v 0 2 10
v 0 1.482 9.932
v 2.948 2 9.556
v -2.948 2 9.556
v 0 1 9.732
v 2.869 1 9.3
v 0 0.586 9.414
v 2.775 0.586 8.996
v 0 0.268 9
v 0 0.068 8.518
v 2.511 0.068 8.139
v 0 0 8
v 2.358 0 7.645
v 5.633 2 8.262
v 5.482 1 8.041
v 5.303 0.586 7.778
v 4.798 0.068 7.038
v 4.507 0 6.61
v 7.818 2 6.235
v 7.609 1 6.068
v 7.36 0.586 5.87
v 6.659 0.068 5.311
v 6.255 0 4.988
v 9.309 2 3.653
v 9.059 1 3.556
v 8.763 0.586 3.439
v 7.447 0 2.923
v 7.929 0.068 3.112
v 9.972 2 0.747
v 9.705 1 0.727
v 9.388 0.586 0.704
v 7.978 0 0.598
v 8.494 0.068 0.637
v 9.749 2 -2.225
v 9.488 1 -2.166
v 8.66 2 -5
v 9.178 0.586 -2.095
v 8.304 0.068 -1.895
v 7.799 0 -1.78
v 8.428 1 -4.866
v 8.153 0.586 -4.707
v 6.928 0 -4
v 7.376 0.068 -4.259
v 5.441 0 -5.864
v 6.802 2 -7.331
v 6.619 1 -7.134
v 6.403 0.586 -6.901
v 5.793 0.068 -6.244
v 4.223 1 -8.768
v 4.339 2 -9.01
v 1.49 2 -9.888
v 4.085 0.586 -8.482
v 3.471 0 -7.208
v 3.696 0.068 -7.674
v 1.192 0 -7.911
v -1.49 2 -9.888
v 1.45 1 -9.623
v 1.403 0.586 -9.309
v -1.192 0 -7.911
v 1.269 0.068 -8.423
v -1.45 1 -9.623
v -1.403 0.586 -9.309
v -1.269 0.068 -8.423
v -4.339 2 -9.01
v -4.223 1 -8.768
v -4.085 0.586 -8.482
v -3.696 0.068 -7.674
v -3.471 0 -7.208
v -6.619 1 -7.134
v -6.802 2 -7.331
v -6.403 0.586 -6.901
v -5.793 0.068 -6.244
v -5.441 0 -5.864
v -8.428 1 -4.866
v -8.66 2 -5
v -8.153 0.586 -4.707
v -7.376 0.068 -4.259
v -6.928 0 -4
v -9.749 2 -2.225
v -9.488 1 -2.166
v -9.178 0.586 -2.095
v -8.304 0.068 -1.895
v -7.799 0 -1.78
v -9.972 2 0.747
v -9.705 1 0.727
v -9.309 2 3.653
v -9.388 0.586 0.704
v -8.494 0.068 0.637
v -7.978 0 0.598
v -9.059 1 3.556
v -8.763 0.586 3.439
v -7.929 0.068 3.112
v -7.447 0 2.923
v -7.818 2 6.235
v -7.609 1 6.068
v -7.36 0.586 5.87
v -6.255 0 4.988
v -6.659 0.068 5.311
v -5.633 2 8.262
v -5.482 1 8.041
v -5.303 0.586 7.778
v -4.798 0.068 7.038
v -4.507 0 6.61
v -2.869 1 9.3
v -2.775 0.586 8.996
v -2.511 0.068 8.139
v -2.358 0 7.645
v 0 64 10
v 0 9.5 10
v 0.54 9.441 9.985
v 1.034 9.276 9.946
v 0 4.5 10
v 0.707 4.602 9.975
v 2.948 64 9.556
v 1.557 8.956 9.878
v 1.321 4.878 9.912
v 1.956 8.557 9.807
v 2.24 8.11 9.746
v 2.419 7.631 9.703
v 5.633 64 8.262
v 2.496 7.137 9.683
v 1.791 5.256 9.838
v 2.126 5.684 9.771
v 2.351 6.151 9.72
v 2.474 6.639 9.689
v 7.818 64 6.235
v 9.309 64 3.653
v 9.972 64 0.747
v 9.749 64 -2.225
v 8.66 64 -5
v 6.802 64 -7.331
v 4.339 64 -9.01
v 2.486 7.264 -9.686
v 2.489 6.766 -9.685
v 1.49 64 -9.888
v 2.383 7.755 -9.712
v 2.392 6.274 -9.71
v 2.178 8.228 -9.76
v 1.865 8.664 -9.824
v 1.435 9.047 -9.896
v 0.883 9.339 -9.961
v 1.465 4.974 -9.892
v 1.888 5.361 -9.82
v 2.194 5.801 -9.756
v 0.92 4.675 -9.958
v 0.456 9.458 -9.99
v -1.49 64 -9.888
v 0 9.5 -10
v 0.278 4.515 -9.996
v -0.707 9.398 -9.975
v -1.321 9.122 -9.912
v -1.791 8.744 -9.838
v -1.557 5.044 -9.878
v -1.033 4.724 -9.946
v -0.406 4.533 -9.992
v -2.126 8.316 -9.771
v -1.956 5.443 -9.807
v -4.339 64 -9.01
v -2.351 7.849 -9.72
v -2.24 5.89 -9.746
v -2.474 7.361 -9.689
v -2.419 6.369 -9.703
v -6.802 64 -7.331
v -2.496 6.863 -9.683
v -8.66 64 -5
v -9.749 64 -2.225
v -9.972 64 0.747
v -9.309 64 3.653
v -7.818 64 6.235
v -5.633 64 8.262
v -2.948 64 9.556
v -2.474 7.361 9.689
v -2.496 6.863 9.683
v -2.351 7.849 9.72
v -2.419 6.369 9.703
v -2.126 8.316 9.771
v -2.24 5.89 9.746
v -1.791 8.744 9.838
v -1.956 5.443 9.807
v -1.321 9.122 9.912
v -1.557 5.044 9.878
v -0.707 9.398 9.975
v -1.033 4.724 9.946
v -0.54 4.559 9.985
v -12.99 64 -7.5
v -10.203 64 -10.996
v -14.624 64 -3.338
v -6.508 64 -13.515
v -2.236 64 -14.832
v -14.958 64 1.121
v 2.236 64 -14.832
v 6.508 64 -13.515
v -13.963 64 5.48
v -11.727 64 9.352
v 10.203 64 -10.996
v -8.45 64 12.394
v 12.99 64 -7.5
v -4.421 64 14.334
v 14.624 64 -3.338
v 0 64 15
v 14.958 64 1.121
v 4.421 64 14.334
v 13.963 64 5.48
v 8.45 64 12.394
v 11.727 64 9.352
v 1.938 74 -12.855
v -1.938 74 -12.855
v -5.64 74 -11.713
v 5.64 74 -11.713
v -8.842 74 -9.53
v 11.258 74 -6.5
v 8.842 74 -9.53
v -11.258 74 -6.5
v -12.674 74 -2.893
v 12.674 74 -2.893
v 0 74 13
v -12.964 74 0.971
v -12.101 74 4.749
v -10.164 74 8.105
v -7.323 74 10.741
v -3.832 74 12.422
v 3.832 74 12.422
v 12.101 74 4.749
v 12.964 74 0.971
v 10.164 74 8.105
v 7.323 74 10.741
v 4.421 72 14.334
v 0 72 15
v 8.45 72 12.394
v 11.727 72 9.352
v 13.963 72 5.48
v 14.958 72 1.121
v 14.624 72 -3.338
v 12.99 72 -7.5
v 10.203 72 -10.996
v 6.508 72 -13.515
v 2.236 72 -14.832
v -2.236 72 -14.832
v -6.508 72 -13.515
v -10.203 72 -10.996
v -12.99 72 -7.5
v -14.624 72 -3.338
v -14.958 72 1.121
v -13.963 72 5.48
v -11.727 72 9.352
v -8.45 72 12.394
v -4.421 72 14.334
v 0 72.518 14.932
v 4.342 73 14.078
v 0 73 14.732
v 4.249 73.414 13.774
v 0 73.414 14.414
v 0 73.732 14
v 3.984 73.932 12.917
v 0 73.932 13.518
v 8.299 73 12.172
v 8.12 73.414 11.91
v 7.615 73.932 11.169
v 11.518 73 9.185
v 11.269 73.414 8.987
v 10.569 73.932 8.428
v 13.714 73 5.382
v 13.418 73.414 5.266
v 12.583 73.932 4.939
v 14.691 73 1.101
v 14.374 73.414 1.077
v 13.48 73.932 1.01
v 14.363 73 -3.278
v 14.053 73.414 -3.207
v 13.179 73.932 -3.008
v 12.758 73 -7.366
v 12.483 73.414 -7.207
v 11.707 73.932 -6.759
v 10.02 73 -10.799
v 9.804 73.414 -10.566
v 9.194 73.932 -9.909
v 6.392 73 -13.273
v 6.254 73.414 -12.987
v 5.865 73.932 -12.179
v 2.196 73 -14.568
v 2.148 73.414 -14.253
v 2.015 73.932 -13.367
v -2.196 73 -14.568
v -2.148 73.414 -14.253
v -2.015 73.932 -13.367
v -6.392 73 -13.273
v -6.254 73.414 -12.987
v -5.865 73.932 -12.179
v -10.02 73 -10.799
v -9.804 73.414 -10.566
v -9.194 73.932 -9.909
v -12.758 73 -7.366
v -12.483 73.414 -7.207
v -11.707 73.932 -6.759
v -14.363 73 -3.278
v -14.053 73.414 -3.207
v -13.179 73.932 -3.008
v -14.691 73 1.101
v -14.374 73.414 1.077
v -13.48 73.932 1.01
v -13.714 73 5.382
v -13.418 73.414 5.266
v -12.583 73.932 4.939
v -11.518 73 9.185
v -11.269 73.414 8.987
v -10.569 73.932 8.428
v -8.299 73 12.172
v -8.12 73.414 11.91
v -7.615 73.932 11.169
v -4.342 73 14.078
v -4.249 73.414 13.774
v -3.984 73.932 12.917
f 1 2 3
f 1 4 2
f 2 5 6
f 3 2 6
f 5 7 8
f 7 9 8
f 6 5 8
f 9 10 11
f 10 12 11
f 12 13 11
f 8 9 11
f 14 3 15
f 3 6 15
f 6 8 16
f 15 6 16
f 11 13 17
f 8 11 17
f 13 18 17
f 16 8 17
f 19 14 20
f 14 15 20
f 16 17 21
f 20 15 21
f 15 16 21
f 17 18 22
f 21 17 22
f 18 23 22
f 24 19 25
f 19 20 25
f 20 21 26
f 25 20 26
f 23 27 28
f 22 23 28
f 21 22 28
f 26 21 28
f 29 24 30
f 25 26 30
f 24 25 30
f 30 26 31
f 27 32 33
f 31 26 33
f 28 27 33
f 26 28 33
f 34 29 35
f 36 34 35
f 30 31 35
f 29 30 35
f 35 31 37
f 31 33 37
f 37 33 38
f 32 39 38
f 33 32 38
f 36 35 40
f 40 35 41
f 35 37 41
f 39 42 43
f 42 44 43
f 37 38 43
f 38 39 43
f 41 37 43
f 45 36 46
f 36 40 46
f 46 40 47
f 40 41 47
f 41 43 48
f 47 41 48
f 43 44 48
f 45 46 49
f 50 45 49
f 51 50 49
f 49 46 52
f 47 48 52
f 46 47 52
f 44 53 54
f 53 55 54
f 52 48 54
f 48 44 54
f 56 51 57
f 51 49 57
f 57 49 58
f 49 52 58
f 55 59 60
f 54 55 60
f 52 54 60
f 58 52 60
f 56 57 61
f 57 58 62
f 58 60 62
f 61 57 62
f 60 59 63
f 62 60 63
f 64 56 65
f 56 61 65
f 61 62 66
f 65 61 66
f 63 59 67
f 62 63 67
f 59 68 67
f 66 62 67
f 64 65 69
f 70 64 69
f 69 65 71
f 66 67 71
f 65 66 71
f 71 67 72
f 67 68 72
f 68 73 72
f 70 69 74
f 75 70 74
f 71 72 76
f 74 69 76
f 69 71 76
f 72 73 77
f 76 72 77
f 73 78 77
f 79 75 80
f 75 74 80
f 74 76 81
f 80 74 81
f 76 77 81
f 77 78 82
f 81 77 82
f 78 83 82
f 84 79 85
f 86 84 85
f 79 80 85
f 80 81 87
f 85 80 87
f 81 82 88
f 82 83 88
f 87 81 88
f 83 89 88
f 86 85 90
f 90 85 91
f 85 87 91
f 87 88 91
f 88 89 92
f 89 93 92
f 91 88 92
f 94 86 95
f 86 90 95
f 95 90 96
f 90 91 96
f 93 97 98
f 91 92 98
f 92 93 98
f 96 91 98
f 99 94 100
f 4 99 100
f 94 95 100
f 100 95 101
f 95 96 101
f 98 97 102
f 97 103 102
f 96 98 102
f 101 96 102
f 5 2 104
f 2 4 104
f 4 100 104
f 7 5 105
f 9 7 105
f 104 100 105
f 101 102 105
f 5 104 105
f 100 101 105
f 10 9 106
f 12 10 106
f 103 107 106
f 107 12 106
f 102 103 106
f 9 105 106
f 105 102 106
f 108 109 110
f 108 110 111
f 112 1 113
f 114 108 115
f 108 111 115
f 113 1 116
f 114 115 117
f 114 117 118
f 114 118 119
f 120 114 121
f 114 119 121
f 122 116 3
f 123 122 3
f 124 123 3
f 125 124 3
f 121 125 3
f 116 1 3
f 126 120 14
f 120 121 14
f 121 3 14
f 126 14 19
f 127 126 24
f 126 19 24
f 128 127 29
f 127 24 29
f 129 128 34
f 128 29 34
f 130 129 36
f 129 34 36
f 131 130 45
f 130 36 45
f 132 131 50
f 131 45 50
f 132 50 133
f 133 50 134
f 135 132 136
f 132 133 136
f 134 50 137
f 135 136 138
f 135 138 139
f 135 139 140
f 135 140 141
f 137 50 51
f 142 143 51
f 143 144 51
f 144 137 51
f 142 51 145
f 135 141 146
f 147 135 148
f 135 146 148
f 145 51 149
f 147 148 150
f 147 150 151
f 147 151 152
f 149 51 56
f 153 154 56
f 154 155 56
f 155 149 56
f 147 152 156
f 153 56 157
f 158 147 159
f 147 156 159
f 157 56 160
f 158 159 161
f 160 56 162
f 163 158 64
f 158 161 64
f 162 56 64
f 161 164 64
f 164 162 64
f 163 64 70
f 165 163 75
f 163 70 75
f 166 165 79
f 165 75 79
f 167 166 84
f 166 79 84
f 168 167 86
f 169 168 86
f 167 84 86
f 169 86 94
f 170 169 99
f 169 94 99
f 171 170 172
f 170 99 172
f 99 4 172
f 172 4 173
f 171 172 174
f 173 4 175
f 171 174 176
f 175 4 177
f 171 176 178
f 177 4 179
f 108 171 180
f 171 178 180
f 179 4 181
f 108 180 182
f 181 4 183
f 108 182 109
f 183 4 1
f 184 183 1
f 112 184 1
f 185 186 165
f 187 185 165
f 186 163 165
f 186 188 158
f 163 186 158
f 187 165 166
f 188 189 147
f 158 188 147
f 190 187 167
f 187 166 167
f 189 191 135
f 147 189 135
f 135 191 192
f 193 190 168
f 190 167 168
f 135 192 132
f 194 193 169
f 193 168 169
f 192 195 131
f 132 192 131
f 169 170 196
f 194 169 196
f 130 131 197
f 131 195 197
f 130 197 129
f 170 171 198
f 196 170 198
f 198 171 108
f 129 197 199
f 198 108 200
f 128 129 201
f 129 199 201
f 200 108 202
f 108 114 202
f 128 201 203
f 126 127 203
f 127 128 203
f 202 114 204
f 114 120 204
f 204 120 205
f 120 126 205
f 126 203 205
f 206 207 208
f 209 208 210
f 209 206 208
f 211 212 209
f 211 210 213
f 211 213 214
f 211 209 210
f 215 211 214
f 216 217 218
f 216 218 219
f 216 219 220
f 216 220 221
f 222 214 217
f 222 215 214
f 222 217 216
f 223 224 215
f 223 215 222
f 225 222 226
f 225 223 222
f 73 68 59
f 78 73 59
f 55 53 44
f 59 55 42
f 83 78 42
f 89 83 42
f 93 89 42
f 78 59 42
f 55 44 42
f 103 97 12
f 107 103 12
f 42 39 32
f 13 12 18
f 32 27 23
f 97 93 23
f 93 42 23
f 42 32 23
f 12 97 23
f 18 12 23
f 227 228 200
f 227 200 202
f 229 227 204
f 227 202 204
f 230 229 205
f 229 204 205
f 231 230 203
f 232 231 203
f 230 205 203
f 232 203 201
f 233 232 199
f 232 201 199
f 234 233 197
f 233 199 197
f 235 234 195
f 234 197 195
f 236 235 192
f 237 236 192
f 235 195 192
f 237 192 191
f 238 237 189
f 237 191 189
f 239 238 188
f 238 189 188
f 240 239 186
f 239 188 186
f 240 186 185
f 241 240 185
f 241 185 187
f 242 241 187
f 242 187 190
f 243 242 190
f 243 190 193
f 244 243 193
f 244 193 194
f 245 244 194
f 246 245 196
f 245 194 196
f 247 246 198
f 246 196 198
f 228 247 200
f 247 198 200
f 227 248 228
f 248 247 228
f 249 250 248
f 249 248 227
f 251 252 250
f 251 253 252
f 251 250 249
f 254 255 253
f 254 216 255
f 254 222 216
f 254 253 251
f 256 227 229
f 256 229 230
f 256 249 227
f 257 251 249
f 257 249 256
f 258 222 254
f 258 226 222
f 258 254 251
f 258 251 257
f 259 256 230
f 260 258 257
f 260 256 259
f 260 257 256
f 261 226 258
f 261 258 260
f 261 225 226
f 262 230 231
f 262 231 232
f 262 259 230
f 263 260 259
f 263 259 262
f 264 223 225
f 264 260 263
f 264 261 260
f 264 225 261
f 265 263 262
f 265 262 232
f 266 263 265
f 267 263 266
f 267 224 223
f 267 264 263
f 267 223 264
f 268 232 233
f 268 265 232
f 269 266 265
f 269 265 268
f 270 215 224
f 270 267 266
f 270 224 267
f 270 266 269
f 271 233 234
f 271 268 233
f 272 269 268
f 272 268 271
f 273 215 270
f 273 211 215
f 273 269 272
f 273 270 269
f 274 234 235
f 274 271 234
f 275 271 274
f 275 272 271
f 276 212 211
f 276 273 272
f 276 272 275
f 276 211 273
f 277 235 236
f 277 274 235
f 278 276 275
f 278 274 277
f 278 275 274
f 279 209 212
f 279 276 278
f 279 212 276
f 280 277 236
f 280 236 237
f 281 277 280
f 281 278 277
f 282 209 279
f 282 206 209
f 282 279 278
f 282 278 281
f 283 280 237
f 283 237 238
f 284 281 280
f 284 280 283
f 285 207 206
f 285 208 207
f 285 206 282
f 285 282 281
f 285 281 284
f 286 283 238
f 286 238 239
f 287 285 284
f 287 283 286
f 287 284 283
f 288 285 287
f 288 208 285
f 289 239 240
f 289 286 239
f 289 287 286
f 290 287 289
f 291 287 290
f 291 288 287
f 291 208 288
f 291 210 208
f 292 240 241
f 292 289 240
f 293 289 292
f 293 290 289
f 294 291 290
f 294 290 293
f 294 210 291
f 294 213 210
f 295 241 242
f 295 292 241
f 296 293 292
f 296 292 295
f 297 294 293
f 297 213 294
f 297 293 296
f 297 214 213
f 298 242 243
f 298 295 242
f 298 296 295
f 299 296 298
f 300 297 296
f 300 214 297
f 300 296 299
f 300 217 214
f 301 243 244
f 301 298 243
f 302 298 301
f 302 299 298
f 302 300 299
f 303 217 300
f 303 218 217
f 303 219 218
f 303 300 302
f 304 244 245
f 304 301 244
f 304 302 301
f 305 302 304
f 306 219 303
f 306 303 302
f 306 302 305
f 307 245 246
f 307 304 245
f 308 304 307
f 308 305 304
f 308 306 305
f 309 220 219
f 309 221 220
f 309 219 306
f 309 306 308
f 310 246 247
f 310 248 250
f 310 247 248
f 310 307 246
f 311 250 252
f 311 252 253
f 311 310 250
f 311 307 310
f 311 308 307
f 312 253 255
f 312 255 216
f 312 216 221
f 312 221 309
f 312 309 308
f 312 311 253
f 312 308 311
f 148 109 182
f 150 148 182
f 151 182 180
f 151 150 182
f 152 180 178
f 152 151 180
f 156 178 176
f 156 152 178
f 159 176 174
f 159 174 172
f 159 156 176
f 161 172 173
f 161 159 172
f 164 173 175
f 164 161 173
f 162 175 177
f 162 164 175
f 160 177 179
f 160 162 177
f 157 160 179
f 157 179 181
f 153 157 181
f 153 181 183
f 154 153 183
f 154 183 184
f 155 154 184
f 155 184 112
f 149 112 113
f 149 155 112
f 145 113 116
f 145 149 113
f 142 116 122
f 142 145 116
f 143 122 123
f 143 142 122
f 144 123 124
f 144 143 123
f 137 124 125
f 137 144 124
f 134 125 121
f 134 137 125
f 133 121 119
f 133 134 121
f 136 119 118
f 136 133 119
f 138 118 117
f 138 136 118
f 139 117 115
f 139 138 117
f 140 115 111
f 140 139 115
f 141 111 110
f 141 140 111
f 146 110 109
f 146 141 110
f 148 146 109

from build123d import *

# Parameters (mm, degrees)
SKETCH1_R               = 10
BOSS_EXTRUDE1_DEPTH     = 64
SKETCH2_R               = 15
BOSS_EXTRUDE2_DEPTH     = 10
CUT_EXTRUDE1_DEPTH      = 77.980517016
CUT_EXTRUDE1_DEPTH_BACK = 77.980517016
SKETCH3_R               = 2.5
FILLET1_R               = 2


with BuildPart() as part:
    # Sketch1 → Boss-Extrude1 (new body)
    with BuildSketch(Plane(origin=(0, 0, 0), x_dir=(1, 0, 0), z_dir=(0, 1, 0))):
        with Locations(Location((0, 0, 0), (0, 0, 270))):
            Circle(SKETCH1_R)
    extrude(amount=BOSS_EXTRUDE1_DEPTH)

    # Sketch2 → Boss-Extrude2 (add)
    with BuildSketch(Plane(origin=(0, 64, 0), x_dir=(1, 0, 0), z_dir=(0, 1, 0))):
        with Locations(Location((0, 0, 0), (0, 0, 270))):
            Circle(SKETCH2_R)
    extrude(amount=BOSS_EXTRUDE2_DEPTH)

    # Sketch3 → Cut-Extrude1 (cut, two sides: drawn at the far end of the back side and taken through both)
    with BuildSketch(Plane.XY.offset(-CUT_EXTRUDE1_DEPTH_BACK)):
        with Locations(Location((0, 7, 0), (0, 0, 90.000000004))):
            Circle(SKETCH3_R)
    extrude(amount=CUT_EXTRUDE1_DEPTH + CUT_EXTRUDE1_DEPTH_BACK, mode=Mode.SUBTRACT)

    # Fillet1
    fillet1_edges = [part.edges().sort_by_distance(p)[0] for p in [
        (0, 0, -10),
        (0, 74, -15),
    ]]
    fillet(fillet1_edges, radius=FILLET1_R)


solid = part.part
